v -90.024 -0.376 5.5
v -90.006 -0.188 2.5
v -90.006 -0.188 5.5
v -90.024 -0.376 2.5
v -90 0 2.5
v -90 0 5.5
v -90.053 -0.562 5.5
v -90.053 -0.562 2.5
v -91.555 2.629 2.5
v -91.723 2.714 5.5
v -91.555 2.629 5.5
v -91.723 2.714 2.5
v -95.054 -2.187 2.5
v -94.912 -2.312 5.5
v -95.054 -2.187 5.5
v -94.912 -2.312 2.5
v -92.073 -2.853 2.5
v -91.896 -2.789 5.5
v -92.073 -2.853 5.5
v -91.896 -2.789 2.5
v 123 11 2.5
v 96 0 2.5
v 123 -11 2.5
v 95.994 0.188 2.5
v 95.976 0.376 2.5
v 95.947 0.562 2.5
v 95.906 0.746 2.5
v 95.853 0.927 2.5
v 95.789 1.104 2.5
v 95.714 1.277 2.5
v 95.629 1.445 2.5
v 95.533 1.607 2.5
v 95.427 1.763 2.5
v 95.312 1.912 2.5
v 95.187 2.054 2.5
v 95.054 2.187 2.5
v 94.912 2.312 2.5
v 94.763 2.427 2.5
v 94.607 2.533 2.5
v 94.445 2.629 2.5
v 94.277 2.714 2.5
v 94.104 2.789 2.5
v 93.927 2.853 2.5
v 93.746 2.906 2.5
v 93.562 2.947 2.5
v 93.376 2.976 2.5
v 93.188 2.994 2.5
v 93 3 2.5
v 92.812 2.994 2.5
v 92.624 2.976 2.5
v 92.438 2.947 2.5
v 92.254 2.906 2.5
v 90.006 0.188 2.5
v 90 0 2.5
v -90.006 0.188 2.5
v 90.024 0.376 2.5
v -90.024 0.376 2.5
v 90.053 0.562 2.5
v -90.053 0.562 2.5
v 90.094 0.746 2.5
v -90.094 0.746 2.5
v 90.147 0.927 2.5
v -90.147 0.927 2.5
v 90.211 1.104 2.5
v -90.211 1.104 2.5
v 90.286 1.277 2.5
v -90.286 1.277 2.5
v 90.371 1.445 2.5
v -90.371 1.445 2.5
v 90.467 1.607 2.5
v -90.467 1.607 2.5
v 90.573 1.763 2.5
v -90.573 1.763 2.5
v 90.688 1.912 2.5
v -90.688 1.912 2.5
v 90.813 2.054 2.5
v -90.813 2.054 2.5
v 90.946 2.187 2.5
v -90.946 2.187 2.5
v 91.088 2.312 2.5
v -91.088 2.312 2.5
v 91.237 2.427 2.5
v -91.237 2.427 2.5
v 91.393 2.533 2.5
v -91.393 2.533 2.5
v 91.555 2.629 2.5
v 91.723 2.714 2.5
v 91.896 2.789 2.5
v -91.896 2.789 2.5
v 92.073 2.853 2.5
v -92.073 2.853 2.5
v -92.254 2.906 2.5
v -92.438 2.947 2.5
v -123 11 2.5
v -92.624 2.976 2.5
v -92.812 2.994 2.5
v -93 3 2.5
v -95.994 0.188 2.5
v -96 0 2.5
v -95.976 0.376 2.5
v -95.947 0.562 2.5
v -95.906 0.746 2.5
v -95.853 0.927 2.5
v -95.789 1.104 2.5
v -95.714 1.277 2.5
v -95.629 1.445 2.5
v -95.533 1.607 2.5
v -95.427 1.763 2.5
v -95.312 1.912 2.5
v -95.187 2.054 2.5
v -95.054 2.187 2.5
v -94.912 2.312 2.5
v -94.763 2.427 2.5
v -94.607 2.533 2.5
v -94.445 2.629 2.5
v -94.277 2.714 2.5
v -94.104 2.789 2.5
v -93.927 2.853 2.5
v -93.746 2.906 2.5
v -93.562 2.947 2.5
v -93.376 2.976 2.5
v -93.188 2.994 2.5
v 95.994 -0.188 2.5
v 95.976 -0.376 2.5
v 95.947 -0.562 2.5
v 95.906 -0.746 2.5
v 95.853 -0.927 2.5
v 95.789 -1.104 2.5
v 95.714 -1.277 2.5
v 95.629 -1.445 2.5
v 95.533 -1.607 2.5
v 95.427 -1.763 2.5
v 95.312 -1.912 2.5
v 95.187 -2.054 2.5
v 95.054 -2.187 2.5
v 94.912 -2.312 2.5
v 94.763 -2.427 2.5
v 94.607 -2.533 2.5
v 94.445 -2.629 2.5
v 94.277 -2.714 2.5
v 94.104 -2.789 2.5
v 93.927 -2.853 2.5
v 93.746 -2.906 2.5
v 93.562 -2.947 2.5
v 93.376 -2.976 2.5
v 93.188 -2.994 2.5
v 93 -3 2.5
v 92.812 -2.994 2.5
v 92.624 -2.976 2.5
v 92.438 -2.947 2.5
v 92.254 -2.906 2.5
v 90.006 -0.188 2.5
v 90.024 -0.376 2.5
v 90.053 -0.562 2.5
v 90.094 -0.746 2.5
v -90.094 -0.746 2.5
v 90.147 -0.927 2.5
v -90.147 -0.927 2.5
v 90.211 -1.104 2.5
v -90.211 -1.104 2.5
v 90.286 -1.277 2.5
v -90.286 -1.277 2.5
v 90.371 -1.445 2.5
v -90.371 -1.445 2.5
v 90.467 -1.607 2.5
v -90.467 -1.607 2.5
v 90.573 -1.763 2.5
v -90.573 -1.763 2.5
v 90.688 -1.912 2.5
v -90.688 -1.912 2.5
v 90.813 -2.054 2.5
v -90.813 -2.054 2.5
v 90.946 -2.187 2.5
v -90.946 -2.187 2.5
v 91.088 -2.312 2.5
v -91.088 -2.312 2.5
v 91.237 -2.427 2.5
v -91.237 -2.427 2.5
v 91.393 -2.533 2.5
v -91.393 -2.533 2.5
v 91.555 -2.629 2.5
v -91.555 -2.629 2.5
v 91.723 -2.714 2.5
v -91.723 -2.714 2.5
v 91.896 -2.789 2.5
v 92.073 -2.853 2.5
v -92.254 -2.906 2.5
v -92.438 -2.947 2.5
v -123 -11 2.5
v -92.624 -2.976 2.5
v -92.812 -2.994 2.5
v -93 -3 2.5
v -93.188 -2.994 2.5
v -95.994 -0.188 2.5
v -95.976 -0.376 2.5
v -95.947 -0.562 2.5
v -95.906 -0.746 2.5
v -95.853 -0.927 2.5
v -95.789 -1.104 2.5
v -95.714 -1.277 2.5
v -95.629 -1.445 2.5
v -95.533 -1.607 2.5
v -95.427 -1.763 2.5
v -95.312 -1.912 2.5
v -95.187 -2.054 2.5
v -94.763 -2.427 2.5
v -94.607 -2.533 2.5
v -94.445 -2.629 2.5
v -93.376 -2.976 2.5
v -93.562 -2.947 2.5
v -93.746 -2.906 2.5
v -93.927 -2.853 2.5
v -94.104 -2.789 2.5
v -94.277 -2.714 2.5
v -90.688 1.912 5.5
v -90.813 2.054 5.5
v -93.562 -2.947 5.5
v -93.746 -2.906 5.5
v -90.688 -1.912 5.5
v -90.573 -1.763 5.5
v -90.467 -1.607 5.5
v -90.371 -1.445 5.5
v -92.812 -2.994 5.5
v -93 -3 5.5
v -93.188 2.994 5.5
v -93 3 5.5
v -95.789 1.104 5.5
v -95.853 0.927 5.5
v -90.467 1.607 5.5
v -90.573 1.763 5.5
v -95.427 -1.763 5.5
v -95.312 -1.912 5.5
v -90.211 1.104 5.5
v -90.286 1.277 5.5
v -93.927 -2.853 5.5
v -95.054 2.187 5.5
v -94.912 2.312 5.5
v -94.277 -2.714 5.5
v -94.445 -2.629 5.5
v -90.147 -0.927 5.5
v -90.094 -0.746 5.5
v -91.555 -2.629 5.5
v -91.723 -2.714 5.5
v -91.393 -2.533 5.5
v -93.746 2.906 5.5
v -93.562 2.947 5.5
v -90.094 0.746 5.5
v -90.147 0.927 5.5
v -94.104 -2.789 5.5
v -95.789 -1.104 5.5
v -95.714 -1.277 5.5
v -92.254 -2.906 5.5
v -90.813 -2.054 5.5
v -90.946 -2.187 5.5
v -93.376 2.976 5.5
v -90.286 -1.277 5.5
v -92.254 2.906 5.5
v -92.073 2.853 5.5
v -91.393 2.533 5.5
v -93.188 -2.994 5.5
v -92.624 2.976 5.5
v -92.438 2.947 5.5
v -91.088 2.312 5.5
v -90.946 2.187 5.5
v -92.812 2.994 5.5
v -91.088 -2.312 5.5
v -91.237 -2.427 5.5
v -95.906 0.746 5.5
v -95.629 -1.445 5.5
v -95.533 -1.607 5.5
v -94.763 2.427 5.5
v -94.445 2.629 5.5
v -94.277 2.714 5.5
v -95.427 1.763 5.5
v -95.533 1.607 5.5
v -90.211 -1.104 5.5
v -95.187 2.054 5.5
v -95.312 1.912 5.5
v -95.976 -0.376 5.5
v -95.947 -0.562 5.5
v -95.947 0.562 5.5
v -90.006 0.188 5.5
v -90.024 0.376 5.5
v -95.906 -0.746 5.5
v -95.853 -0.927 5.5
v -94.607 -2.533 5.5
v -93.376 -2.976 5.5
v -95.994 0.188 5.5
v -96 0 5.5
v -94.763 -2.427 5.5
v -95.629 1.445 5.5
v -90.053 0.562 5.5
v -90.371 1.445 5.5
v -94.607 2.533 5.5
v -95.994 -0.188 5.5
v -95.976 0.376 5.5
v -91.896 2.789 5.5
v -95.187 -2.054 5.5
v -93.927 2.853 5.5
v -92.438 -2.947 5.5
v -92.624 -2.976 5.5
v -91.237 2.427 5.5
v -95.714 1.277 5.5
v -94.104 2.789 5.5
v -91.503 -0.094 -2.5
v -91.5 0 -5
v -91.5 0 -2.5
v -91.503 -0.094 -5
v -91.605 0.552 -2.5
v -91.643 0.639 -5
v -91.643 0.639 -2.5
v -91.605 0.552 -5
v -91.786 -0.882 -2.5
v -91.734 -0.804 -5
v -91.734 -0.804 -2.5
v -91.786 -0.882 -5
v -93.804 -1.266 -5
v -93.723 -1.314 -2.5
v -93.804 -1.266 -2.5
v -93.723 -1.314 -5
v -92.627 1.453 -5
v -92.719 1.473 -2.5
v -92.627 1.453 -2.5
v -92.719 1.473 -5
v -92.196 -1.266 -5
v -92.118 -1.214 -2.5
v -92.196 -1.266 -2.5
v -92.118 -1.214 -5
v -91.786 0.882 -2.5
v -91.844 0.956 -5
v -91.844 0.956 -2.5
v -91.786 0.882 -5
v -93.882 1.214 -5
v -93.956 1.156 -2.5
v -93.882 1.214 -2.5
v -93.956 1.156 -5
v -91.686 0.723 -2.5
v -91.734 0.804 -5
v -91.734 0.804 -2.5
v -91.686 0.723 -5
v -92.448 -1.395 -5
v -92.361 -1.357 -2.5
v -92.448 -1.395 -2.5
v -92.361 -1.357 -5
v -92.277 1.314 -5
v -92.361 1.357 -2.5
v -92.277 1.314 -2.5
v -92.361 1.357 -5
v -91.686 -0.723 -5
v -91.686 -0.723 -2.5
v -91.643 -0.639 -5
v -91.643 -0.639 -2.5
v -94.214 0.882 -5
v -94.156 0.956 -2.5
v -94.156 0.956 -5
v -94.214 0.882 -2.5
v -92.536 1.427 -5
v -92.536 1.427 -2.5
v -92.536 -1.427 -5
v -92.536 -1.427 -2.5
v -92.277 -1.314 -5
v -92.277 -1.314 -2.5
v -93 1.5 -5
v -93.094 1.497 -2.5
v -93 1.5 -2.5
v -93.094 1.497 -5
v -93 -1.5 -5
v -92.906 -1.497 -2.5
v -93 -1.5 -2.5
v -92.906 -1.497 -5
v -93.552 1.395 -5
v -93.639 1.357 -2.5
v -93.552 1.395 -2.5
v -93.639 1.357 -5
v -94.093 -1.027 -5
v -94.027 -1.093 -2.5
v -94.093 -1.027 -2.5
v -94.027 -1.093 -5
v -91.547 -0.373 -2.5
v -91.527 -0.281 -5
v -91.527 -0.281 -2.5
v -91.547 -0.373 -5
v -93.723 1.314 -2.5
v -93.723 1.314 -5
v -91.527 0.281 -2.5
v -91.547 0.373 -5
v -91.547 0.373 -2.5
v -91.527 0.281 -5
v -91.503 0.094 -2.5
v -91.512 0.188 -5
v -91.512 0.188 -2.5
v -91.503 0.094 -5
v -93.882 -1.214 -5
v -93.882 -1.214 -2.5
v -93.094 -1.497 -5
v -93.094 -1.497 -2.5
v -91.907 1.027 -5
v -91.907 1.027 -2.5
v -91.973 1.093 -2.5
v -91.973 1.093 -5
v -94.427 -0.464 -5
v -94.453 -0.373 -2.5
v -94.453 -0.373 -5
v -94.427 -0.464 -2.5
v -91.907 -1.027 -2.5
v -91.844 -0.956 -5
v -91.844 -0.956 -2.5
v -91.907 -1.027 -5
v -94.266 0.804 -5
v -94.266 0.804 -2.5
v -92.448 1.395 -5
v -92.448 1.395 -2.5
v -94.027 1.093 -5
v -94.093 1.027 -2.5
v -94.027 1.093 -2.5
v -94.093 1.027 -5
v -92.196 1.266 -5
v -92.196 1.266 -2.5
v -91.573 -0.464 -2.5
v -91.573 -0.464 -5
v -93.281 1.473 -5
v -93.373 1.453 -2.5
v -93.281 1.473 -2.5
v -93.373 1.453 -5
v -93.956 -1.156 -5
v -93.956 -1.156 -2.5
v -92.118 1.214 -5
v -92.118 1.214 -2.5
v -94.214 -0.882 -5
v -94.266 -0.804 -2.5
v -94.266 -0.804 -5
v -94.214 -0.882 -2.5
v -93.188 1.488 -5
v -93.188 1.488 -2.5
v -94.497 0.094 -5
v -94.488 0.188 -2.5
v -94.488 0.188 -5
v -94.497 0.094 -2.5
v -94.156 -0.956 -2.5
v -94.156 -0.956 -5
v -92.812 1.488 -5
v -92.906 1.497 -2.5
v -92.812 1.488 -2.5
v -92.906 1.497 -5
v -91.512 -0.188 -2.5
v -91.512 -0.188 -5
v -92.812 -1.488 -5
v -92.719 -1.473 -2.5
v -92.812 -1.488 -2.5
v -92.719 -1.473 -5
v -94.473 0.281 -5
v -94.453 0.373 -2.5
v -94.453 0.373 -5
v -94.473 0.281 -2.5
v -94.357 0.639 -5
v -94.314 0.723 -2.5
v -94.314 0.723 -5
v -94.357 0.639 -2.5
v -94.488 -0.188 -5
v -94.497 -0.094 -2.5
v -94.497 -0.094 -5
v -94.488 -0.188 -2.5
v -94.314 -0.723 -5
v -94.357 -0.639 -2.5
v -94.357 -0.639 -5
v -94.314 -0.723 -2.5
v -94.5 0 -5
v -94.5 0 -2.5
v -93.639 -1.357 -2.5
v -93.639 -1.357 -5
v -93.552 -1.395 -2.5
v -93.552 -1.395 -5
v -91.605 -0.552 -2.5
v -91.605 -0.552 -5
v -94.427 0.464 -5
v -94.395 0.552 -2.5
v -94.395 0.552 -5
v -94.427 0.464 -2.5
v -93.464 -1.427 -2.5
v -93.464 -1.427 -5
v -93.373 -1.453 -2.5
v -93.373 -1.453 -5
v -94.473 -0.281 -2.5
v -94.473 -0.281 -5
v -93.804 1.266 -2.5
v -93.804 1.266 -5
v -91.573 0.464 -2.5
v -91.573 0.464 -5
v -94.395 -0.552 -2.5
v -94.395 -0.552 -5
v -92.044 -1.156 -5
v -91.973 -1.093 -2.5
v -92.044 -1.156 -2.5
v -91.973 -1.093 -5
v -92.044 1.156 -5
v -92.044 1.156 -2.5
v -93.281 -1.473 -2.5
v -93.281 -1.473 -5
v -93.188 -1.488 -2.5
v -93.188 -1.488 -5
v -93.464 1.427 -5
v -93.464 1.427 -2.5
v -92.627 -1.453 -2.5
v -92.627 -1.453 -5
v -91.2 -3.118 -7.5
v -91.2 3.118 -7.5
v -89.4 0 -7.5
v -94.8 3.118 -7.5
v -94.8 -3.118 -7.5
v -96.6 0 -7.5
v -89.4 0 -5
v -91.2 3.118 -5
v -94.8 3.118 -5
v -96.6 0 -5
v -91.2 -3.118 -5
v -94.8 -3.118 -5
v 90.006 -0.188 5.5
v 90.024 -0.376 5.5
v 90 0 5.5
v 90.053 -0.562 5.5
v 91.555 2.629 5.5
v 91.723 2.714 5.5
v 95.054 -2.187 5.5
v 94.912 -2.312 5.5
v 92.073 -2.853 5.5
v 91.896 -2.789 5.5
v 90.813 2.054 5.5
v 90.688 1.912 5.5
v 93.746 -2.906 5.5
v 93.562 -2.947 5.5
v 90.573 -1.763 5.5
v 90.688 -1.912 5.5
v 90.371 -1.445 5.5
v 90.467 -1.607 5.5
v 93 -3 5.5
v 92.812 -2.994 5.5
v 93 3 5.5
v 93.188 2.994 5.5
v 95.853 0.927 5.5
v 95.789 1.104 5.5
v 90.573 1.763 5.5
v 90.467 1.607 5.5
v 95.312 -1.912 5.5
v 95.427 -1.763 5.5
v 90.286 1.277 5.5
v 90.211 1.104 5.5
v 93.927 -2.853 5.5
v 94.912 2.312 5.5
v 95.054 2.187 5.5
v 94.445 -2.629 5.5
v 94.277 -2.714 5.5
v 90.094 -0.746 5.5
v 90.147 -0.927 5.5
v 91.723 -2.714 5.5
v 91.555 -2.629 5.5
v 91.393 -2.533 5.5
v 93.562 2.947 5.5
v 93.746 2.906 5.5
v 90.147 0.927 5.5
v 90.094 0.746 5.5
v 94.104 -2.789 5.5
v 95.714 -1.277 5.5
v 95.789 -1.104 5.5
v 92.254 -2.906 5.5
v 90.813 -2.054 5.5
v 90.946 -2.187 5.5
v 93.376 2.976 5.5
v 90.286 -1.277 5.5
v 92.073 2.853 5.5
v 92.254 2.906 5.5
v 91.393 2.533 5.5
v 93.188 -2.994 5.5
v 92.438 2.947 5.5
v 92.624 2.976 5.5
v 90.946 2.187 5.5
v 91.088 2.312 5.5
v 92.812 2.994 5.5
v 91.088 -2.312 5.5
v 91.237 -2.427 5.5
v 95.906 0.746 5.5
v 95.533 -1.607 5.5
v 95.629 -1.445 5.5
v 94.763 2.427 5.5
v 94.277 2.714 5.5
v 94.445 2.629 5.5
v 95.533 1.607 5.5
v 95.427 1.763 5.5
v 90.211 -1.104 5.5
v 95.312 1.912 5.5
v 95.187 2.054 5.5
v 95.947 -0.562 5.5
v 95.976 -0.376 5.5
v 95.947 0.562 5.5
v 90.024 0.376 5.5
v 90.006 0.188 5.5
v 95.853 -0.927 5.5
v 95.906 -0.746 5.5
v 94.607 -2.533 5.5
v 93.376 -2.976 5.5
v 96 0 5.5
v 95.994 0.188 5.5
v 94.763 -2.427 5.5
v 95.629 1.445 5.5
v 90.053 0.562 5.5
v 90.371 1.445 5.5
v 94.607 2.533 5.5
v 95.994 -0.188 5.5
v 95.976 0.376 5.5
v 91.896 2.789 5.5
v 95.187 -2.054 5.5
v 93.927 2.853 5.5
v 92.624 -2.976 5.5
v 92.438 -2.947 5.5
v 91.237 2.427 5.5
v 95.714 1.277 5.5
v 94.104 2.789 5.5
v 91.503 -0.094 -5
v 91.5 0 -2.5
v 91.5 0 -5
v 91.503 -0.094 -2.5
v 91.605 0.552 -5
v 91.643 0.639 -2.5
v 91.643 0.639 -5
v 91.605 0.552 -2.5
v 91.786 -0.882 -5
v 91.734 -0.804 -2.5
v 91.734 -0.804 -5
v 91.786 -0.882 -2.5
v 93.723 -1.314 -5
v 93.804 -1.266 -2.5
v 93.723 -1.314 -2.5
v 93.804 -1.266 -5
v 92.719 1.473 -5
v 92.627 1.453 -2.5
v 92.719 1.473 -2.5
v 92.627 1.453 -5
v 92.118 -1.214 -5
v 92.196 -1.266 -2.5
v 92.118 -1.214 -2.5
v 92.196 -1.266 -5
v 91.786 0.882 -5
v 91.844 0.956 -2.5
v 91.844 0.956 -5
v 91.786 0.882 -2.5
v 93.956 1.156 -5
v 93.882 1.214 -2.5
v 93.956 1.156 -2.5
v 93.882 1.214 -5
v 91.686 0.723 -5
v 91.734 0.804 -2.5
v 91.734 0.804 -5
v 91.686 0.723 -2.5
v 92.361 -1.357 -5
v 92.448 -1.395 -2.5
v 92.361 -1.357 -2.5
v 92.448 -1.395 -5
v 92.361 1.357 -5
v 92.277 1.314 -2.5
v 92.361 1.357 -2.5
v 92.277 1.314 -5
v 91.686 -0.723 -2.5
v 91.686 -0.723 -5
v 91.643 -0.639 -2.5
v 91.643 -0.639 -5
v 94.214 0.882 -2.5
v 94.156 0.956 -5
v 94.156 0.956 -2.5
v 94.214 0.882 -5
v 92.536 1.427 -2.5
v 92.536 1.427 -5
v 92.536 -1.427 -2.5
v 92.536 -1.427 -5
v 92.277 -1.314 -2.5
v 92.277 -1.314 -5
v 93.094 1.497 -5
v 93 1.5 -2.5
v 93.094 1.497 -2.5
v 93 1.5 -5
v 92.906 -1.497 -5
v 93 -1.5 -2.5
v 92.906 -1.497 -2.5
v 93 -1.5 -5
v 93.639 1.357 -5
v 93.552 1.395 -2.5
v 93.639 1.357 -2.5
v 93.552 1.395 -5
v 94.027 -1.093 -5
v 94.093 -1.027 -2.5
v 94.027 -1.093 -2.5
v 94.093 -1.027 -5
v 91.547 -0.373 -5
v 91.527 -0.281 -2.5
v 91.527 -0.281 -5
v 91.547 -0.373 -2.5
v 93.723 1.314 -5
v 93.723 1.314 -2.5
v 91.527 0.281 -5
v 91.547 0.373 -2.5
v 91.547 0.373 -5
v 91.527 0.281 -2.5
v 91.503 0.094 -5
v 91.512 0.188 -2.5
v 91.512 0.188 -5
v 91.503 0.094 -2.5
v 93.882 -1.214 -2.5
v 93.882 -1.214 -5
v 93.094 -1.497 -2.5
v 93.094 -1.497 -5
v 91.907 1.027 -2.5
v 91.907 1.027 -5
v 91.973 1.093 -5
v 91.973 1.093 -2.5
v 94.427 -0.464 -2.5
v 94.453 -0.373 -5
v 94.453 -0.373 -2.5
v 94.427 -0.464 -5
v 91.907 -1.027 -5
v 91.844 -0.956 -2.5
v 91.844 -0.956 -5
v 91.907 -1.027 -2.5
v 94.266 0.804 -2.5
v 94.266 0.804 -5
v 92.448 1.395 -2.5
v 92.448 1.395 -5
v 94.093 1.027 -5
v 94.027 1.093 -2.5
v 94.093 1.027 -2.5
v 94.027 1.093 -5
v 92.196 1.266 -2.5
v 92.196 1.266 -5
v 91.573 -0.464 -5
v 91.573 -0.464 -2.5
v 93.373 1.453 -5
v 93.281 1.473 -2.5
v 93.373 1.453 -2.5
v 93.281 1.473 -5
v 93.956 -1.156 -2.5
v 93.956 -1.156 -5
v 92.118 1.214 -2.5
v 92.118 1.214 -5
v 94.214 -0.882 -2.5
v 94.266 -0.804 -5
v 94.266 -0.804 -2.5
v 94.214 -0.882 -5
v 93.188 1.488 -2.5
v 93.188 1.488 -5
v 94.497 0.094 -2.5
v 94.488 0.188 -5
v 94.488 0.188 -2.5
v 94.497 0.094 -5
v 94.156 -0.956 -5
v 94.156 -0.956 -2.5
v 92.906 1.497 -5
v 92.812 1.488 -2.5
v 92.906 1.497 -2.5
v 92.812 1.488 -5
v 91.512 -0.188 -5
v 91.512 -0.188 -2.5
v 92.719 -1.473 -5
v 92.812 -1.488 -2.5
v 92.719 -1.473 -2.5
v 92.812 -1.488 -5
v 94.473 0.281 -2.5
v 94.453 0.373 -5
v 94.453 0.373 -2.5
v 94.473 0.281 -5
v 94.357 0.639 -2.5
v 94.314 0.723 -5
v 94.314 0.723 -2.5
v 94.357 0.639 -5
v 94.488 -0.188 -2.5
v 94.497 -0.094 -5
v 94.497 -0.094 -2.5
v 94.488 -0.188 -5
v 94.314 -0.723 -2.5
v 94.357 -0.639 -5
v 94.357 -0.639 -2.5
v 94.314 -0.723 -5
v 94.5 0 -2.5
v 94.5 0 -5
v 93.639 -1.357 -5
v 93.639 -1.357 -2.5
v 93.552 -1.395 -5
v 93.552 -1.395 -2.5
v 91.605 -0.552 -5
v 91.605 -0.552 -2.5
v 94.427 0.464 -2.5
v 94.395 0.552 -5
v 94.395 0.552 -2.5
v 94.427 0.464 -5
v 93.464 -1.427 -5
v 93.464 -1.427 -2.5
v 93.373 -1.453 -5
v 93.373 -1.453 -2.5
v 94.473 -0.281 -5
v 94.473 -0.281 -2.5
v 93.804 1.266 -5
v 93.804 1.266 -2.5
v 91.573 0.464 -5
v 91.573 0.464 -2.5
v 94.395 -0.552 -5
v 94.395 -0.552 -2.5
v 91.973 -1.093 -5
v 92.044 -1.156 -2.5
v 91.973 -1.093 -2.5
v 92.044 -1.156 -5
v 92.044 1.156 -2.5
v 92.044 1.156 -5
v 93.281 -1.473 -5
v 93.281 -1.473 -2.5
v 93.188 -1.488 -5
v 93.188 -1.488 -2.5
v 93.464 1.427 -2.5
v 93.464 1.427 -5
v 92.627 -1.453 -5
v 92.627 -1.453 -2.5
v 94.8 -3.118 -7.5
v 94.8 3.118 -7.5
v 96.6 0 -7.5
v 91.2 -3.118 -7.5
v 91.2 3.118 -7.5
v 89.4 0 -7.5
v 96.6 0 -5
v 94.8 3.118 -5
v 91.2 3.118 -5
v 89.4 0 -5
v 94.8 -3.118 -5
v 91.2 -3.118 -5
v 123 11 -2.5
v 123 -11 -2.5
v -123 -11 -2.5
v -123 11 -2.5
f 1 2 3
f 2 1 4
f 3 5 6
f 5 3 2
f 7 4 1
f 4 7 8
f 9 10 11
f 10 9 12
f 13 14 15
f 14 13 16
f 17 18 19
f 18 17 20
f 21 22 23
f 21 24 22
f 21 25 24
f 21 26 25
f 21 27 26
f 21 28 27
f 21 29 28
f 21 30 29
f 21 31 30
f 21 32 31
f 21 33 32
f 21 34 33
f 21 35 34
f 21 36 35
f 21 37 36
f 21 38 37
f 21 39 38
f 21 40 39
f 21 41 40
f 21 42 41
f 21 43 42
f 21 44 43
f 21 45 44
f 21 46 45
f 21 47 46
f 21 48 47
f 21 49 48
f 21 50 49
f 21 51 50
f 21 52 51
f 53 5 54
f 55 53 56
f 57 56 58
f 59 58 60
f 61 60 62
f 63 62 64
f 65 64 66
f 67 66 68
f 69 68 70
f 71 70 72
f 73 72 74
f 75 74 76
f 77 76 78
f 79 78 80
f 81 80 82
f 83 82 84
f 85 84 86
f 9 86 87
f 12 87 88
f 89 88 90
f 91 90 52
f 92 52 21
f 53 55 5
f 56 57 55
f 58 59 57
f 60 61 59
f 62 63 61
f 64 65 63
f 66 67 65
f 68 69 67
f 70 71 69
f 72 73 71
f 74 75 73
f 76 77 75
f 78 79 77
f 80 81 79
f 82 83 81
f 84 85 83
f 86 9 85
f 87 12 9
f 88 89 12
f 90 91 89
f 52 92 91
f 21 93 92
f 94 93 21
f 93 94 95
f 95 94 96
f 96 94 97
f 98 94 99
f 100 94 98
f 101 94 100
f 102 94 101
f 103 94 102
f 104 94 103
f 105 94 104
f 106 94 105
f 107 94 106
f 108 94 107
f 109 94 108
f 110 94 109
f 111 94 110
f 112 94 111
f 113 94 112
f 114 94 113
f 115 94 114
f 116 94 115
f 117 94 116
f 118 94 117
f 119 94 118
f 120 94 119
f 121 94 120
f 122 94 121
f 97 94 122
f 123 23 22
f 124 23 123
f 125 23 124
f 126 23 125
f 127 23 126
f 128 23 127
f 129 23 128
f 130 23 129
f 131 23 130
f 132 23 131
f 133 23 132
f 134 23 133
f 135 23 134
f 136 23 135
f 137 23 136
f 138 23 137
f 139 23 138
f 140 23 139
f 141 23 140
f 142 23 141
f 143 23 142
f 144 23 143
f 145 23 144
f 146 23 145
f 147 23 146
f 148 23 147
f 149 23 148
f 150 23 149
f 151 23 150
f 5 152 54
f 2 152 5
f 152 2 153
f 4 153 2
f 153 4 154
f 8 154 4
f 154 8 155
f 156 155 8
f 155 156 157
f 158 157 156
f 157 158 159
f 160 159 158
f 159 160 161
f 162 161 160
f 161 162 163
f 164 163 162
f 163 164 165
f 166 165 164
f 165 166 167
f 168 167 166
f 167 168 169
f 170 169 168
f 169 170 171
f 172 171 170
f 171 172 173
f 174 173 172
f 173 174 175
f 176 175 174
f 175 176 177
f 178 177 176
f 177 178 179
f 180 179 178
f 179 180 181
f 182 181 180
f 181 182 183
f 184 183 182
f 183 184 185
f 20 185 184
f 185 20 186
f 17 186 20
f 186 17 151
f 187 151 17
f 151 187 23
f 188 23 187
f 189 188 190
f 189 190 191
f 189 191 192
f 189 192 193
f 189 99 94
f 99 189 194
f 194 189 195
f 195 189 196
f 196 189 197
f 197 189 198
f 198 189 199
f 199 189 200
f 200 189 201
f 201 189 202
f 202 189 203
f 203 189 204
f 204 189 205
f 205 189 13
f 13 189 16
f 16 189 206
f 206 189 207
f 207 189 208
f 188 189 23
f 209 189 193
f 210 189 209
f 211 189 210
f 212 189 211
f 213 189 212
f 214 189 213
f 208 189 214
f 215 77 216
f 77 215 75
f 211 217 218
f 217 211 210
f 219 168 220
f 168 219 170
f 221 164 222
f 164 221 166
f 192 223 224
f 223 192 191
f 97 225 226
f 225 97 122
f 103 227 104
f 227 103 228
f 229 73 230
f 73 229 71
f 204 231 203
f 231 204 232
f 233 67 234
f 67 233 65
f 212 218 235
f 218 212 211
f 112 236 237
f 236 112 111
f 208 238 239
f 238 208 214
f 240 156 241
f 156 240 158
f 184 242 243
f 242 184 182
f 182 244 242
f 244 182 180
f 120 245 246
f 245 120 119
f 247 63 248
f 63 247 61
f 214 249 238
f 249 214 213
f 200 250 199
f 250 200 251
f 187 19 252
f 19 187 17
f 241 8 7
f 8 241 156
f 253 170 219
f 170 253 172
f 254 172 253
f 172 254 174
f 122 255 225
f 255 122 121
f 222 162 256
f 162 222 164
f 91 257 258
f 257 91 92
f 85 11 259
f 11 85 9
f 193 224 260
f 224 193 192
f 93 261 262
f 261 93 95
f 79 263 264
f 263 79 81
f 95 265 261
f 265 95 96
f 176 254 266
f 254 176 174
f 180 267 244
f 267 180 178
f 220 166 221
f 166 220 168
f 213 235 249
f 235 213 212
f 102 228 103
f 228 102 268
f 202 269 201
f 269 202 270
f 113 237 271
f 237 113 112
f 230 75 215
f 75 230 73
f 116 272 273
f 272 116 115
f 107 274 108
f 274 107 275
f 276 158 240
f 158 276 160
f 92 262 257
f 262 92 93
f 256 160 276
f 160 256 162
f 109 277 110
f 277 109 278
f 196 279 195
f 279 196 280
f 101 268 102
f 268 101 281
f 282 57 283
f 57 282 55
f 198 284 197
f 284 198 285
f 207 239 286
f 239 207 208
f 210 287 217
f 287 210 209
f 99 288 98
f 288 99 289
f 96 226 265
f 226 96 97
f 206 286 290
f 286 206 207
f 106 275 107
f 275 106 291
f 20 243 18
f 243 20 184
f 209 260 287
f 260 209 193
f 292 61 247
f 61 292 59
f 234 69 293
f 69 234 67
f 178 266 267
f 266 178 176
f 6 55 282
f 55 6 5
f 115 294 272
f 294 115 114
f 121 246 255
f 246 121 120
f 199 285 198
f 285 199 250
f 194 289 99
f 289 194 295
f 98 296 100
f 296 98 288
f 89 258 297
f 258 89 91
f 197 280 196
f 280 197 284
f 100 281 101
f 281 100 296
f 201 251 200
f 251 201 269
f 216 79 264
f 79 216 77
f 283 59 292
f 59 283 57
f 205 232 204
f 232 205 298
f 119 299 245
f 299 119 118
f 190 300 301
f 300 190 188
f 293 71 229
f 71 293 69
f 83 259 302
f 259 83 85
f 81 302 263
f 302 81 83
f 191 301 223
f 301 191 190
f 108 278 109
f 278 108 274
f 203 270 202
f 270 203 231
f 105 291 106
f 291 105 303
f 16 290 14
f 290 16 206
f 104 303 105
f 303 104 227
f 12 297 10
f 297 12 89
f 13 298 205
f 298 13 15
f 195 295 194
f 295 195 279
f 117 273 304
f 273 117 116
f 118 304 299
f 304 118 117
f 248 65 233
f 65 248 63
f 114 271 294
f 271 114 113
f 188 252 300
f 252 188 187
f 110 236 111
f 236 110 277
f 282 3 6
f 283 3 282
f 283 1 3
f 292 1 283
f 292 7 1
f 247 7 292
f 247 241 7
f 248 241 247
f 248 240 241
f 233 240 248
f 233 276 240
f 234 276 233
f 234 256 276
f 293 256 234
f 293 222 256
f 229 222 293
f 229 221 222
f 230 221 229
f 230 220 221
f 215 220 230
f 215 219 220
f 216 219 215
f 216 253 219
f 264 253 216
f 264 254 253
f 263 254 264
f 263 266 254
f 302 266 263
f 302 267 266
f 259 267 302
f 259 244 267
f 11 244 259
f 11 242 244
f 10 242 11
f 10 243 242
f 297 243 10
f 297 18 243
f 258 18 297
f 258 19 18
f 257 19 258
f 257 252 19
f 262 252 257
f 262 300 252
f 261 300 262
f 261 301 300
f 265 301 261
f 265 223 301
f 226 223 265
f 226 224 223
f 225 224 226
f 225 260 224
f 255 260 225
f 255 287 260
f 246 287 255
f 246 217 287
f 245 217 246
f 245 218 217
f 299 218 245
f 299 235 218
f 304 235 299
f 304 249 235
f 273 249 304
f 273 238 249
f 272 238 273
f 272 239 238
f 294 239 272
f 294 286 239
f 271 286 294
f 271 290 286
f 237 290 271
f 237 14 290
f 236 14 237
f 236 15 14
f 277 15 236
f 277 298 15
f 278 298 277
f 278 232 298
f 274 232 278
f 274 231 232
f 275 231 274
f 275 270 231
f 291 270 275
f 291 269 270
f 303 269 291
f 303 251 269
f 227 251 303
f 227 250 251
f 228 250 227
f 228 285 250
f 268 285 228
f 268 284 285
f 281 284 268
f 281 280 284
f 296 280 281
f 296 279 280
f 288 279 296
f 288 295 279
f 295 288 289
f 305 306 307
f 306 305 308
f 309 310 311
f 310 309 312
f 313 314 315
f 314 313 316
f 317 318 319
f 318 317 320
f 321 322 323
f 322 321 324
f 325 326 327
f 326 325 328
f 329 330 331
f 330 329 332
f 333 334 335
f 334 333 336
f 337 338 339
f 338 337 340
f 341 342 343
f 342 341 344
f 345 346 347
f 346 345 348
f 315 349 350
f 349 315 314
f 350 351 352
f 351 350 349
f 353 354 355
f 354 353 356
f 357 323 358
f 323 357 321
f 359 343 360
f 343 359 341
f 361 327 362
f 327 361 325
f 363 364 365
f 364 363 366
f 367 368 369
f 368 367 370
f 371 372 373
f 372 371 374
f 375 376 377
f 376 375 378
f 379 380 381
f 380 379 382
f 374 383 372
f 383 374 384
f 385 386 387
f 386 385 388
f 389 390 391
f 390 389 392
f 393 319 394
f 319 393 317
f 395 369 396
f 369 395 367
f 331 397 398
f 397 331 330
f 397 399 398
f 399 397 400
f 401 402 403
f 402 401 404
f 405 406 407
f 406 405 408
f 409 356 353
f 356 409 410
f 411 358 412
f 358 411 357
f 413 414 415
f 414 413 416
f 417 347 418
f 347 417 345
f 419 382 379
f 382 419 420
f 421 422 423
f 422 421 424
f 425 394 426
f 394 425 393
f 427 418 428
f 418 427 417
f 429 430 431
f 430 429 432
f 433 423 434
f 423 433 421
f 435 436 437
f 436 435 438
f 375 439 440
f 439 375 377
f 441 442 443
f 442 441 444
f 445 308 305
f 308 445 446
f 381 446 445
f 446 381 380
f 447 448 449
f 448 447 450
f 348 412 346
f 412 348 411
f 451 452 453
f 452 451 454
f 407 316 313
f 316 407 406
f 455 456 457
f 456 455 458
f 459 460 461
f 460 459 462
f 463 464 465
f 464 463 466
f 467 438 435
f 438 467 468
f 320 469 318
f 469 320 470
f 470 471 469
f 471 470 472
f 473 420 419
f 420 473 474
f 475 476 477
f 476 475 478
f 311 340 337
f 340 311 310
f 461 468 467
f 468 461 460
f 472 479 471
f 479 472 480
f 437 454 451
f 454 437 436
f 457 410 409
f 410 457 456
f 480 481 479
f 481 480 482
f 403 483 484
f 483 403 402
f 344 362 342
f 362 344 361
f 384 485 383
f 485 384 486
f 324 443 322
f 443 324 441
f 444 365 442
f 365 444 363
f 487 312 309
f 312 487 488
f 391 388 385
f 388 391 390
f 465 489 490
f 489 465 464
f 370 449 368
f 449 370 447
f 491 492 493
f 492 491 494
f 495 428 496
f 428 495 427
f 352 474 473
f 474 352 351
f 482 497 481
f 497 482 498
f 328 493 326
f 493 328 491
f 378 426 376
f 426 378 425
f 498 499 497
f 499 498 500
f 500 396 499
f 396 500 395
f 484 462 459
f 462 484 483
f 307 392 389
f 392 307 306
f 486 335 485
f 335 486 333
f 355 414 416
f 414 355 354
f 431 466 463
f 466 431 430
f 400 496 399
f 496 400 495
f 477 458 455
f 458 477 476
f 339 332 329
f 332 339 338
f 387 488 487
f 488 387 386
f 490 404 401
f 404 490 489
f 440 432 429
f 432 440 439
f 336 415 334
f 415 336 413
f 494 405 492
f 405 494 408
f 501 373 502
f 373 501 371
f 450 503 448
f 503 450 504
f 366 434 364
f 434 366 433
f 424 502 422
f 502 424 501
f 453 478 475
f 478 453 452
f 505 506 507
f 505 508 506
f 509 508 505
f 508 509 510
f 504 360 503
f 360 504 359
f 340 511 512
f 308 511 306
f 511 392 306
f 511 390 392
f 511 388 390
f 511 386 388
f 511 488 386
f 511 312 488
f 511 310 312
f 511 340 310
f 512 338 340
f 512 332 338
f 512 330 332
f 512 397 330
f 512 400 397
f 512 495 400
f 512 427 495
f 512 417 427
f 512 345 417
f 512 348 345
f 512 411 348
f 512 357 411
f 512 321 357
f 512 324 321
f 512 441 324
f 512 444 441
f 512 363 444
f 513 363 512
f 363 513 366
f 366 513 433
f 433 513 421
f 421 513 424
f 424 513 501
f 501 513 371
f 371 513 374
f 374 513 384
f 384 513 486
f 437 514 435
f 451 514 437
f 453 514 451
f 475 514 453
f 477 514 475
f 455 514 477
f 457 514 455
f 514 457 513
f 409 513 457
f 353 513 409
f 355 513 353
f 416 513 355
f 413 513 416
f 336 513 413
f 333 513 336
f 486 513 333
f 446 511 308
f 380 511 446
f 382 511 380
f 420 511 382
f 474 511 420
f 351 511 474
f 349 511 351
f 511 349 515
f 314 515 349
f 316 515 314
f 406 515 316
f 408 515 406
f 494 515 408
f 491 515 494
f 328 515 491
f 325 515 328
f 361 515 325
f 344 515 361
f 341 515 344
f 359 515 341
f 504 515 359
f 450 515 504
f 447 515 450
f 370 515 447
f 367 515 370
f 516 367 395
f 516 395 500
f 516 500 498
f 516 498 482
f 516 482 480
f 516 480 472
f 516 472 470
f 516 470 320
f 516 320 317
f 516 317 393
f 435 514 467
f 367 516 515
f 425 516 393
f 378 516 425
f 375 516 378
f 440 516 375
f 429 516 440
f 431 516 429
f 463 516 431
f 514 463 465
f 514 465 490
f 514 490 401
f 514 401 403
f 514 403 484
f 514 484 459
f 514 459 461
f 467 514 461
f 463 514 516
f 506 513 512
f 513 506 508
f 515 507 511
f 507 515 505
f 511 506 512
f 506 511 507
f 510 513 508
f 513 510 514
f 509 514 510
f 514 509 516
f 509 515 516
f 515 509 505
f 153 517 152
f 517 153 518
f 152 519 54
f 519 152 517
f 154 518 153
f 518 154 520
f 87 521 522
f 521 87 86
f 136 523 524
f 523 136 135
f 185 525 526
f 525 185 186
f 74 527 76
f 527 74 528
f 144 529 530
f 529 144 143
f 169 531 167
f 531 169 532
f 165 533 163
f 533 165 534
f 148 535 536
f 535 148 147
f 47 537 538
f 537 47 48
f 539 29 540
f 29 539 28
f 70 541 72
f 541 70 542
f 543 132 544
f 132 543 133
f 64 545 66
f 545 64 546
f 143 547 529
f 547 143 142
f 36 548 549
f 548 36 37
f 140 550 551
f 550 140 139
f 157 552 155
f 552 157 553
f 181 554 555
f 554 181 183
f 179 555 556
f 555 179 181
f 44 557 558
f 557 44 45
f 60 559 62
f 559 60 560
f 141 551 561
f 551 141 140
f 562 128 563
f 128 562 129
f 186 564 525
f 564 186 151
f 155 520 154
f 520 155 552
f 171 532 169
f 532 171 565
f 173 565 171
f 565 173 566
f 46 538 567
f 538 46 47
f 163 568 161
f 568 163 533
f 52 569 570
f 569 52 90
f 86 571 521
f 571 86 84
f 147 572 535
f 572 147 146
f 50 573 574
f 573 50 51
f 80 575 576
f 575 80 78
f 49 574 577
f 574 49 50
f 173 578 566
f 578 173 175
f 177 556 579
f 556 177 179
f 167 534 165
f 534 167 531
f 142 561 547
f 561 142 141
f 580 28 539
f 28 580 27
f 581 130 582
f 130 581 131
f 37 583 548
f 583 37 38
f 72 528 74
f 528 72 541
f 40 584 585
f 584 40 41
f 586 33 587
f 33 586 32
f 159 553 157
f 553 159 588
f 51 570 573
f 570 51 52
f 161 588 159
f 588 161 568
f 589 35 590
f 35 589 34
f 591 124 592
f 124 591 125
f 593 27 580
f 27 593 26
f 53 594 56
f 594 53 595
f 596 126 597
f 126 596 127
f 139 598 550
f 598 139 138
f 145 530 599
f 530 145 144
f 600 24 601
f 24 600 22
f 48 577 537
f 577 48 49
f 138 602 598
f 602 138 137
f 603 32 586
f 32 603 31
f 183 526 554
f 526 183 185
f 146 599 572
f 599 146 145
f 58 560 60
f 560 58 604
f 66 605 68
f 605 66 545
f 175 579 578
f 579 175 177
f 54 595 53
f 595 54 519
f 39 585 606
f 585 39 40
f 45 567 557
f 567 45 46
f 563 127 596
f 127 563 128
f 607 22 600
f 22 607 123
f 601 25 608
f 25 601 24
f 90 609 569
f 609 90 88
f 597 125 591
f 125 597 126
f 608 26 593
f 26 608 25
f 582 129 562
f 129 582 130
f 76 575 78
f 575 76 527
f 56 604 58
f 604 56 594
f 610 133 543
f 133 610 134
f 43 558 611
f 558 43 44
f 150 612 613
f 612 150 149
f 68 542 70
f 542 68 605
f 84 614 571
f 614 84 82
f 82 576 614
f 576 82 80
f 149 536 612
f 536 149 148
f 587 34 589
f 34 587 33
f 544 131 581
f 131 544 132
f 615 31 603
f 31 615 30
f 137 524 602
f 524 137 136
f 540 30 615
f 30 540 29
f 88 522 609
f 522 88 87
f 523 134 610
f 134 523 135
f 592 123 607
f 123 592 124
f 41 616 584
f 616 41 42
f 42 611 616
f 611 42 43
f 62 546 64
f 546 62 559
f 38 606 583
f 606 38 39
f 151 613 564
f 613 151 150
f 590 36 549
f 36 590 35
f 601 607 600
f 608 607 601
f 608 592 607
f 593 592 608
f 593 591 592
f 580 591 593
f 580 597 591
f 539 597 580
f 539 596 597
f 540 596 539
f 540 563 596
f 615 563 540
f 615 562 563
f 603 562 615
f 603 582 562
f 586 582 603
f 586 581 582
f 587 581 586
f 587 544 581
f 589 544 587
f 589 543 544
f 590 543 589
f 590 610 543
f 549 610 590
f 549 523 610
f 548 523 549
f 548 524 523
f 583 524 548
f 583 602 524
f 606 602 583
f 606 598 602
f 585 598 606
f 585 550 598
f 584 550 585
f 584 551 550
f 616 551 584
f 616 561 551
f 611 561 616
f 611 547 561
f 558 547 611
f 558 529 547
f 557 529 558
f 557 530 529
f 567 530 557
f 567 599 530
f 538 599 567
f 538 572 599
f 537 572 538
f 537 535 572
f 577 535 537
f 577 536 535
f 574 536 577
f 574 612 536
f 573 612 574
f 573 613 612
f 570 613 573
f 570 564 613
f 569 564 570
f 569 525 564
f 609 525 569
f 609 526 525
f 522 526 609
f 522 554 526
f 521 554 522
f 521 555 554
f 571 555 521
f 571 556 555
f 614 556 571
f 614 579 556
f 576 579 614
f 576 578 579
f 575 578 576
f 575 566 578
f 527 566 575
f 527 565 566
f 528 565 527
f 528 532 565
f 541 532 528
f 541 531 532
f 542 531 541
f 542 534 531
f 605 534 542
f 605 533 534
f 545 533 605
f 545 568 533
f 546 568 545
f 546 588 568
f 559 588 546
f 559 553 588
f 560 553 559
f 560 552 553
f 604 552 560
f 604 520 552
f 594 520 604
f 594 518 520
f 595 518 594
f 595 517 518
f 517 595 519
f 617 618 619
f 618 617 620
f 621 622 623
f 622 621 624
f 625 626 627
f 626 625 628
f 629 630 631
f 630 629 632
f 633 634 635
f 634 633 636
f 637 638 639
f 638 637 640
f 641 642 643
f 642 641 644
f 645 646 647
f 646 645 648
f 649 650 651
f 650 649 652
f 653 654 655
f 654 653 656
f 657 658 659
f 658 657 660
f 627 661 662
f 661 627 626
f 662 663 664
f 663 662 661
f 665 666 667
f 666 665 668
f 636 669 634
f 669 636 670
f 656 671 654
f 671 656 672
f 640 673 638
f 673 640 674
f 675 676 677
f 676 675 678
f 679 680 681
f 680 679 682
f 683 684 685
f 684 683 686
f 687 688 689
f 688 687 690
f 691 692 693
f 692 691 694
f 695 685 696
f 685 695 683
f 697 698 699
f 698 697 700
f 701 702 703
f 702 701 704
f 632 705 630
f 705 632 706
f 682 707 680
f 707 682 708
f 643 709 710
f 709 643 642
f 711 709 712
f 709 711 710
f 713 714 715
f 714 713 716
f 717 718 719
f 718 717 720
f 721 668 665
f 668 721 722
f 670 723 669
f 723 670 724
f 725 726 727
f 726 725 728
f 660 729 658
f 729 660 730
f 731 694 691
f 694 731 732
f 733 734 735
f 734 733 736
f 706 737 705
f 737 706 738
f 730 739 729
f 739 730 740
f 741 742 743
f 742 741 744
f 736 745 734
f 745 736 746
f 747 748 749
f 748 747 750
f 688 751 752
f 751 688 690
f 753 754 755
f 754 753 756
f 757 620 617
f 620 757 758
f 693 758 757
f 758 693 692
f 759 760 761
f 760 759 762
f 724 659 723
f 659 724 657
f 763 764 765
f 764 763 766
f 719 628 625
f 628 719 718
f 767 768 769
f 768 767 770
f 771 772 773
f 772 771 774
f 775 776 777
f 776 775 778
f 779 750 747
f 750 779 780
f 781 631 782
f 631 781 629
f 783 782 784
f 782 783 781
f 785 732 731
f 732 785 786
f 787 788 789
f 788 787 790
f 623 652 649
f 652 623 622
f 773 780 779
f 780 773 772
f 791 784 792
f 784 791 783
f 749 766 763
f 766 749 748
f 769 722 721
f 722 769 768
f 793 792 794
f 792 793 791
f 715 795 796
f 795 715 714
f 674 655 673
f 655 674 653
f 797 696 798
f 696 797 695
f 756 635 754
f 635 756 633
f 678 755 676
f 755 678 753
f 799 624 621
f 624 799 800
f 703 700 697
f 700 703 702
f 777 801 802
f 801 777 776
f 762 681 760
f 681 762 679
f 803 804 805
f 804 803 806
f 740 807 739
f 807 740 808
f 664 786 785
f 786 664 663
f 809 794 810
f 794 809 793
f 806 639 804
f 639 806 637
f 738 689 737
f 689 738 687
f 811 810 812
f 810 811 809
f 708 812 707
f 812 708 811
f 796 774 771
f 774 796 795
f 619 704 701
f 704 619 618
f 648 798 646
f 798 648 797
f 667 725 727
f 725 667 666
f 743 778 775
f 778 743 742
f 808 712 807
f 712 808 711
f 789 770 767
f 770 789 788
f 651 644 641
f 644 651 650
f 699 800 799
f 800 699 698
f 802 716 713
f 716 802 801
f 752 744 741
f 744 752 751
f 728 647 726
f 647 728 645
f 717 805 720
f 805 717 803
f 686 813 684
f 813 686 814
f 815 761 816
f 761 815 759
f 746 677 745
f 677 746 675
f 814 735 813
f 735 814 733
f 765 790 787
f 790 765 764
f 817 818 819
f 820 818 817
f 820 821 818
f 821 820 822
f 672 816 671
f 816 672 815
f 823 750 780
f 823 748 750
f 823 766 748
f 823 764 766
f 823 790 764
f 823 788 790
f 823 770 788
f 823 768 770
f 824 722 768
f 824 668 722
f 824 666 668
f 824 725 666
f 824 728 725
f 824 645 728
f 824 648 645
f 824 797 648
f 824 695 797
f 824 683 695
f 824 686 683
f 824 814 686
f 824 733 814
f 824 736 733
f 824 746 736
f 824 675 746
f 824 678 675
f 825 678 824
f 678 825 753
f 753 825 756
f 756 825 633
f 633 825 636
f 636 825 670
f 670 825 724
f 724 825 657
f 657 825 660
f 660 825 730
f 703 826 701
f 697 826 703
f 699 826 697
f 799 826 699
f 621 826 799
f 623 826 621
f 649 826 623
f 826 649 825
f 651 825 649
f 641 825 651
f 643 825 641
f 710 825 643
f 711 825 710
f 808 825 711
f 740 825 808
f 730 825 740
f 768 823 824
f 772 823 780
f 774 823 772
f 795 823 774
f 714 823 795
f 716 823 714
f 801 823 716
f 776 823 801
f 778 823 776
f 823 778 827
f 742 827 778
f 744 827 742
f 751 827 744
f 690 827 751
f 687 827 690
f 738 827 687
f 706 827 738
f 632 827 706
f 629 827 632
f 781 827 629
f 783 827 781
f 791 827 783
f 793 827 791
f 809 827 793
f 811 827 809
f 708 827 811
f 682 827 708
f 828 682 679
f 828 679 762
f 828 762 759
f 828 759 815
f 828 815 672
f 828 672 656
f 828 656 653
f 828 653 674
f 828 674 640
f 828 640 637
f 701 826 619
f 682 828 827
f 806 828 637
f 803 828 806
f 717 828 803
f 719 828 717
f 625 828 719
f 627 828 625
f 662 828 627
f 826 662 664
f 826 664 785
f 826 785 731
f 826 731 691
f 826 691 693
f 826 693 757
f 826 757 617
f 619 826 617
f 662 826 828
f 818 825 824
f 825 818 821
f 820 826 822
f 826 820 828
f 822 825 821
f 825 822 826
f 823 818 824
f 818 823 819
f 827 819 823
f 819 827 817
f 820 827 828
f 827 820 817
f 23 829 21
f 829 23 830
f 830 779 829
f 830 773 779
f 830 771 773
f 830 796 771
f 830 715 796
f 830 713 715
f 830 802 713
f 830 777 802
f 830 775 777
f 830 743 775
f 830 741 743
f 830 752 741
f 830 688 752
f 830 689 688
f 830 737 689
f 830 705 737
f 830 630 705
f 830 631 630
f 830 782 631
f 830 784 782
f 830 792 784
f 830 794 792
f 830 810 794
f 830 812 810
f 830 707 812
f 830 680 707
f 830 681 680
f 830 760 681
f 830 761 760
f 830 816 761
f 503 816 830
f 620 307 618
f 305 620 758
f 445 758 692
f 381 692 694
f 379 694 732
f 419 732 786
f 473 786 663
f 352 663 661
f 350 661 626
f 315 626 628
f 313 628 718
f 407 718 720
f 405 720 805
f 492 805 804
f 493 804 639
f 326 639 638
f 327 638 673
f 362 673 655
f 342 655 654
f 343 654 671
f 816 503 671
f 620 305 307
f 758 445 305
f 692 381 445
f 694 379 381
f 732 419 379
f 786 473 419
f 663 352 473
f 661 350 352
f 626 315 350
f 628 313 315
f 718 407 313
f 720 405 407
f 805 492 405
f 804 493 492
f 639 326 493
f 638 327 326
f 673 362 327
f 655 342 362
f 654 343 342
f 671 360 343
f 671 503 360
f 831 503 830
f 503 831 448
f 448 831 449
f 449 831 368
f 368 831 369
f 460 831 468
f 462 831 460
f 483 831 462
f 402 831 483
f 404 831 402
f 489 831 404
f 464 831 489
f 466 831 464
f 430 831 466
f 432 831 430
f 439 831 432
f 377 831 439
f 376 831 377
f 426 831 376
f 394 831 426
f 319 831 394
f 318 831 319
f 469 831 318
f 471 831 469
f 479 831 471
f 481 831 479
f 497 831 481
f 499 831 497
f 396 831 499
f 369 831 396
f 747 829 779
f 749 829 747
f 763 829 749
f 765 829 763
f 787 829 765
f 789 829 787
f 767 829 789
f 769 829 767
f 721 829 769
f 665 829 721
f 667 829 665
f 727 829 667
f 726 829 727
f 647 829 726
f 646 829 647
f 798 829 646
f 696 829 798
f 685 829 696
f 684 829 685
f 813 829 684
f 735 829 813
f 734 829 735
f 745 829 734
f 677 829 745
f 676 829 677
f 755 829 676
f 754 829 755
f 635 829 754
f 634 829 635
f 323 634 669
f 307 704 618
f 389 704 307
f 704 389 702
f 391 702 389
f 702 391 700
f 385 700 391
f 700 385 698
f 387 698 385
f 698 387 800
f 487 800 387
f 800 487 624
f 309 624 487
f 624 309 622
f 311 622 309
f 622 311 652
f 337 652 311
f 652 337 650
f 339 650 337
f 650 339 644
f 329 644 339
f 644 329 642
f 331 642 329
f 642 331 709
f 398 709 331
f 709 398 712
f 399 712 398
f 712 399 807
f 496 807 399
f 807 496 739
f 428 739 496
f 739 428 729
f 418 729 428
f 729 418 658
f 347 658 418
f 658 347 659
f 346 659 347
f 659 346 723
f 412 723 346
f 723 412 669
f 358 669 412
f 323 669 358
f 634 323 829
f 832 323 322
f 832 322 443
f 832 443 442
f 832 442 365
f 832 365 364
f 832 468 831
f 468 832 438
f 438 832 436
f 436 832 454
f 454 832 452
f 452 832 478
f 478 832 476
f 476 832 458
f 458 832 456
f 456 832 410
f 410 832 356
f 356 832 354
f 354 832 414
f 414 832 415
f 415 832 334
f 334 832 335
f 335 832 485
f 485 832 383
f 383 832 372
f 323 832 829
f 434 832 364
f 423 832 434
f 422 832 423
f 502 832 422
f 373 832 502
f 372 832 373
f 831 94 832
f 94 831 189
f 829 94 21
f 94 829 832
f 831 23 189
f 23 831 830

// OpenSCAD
// file: common/nut.scad
// 1.5^2 + y^2 = 3^2
// sqrt(3^2 - 1.5^2)
//       30
//    /   |
// 60  - 90
// cos(30) = x / 3
// x = 3 cos(30)
module hex(side_length=3) {
  points = [[0,0], [side_length, 0], [side_length / 2, side_length * cos(30)]];
  for (i=[0:1:5]) {
    rotate([0,0,i * 60]) polygon(points);
  }
}

module hex_nut(side_length=3, height=2) {
    linear_extrude(height=height) hex(side_length);
}

module square_nut(side_length=5, height=2, _offset=0) {
    cube([5 + _offset,5,2]);
}
// file: common/screw.scad
$fn=100;

module screw(screw_head_radius=3, screw_head_height=3, threaded_radius=1.5, threaded_height=10) {
  // screw head
  cylinder(h=screw_head_height, r=screw_head_radius);

  translate([0, 0, screw_head_height]) {
    cylinder(h=threaded_height, r=threaded_radius);
  }
}

// m3x10

screw(screw_head_radius=3, screw_head_height=3, threaded_radius=1.5, threaded_height=10);
// file: common/screw_with_nut.scad
use <screw.scad>
use <nut.scad>

module screw_with_nut(
  hex_nut_height=2.5,
  screw_head_height=3,
  threaded_height=10,
  threaded_radius=1.5,
  screw_head_radius=3,
  hex_nut_side_length=3.6,
  square_nut_height=2,
  square_nut_side_length=5,
  nut_type="hex"
) {
  screw(screw_head_radius=screw_head_radius, screw_head_height=screw_head_height, threaded_radius=threaded_radius, threaded_height=threaded_height);

  if (nut_type == "hex") {
    translate([0,0, screw_head_height + threaded_height - hex_nut_height]) {
      hex_nut(side_length=hex_nut_side_length, height=hex_nut_height);
    }
  }

  else if (nut_type == "square"){
    rotate([0,0,-90])
    translate([
        -square_nut_side_length / 2,
        -square_nut_side_length / 2,
        screw_head_height + threaded_height - square_nut_height
    ]) {
      square_nut(
          side_length=square_nut_side_length,
          height=square_nut_height,
          _offset=5);
    }
  }

}

screw_with_nut(nut_type="square");
// main file
use <common/screw_with_nut.scad>

module left_screw_nut() {
  translate([-93,0,5.5]) {
    rotate([180,0,0])
    screw_with_nut();
  }
}

module flexible_handle(screw) {
  if (!screw) {
    cube([246, 22, 5], center=true);
  }
  left_screw_nut();
  mirror([1,0,0])
    left_screw_nut();
}

module flexible_handle_for_laminair(fan_diameter, y_spacing, depth, filter_z, grid_z, screw=true) {
  translate([0,fan_diameter + y_spacing + depth + 6,(filter_z + grid_z)/ 2]) {
    rotate([-90,0,0])
      flexible_handle(screw=screw);
  }
}

flexible_handle();
